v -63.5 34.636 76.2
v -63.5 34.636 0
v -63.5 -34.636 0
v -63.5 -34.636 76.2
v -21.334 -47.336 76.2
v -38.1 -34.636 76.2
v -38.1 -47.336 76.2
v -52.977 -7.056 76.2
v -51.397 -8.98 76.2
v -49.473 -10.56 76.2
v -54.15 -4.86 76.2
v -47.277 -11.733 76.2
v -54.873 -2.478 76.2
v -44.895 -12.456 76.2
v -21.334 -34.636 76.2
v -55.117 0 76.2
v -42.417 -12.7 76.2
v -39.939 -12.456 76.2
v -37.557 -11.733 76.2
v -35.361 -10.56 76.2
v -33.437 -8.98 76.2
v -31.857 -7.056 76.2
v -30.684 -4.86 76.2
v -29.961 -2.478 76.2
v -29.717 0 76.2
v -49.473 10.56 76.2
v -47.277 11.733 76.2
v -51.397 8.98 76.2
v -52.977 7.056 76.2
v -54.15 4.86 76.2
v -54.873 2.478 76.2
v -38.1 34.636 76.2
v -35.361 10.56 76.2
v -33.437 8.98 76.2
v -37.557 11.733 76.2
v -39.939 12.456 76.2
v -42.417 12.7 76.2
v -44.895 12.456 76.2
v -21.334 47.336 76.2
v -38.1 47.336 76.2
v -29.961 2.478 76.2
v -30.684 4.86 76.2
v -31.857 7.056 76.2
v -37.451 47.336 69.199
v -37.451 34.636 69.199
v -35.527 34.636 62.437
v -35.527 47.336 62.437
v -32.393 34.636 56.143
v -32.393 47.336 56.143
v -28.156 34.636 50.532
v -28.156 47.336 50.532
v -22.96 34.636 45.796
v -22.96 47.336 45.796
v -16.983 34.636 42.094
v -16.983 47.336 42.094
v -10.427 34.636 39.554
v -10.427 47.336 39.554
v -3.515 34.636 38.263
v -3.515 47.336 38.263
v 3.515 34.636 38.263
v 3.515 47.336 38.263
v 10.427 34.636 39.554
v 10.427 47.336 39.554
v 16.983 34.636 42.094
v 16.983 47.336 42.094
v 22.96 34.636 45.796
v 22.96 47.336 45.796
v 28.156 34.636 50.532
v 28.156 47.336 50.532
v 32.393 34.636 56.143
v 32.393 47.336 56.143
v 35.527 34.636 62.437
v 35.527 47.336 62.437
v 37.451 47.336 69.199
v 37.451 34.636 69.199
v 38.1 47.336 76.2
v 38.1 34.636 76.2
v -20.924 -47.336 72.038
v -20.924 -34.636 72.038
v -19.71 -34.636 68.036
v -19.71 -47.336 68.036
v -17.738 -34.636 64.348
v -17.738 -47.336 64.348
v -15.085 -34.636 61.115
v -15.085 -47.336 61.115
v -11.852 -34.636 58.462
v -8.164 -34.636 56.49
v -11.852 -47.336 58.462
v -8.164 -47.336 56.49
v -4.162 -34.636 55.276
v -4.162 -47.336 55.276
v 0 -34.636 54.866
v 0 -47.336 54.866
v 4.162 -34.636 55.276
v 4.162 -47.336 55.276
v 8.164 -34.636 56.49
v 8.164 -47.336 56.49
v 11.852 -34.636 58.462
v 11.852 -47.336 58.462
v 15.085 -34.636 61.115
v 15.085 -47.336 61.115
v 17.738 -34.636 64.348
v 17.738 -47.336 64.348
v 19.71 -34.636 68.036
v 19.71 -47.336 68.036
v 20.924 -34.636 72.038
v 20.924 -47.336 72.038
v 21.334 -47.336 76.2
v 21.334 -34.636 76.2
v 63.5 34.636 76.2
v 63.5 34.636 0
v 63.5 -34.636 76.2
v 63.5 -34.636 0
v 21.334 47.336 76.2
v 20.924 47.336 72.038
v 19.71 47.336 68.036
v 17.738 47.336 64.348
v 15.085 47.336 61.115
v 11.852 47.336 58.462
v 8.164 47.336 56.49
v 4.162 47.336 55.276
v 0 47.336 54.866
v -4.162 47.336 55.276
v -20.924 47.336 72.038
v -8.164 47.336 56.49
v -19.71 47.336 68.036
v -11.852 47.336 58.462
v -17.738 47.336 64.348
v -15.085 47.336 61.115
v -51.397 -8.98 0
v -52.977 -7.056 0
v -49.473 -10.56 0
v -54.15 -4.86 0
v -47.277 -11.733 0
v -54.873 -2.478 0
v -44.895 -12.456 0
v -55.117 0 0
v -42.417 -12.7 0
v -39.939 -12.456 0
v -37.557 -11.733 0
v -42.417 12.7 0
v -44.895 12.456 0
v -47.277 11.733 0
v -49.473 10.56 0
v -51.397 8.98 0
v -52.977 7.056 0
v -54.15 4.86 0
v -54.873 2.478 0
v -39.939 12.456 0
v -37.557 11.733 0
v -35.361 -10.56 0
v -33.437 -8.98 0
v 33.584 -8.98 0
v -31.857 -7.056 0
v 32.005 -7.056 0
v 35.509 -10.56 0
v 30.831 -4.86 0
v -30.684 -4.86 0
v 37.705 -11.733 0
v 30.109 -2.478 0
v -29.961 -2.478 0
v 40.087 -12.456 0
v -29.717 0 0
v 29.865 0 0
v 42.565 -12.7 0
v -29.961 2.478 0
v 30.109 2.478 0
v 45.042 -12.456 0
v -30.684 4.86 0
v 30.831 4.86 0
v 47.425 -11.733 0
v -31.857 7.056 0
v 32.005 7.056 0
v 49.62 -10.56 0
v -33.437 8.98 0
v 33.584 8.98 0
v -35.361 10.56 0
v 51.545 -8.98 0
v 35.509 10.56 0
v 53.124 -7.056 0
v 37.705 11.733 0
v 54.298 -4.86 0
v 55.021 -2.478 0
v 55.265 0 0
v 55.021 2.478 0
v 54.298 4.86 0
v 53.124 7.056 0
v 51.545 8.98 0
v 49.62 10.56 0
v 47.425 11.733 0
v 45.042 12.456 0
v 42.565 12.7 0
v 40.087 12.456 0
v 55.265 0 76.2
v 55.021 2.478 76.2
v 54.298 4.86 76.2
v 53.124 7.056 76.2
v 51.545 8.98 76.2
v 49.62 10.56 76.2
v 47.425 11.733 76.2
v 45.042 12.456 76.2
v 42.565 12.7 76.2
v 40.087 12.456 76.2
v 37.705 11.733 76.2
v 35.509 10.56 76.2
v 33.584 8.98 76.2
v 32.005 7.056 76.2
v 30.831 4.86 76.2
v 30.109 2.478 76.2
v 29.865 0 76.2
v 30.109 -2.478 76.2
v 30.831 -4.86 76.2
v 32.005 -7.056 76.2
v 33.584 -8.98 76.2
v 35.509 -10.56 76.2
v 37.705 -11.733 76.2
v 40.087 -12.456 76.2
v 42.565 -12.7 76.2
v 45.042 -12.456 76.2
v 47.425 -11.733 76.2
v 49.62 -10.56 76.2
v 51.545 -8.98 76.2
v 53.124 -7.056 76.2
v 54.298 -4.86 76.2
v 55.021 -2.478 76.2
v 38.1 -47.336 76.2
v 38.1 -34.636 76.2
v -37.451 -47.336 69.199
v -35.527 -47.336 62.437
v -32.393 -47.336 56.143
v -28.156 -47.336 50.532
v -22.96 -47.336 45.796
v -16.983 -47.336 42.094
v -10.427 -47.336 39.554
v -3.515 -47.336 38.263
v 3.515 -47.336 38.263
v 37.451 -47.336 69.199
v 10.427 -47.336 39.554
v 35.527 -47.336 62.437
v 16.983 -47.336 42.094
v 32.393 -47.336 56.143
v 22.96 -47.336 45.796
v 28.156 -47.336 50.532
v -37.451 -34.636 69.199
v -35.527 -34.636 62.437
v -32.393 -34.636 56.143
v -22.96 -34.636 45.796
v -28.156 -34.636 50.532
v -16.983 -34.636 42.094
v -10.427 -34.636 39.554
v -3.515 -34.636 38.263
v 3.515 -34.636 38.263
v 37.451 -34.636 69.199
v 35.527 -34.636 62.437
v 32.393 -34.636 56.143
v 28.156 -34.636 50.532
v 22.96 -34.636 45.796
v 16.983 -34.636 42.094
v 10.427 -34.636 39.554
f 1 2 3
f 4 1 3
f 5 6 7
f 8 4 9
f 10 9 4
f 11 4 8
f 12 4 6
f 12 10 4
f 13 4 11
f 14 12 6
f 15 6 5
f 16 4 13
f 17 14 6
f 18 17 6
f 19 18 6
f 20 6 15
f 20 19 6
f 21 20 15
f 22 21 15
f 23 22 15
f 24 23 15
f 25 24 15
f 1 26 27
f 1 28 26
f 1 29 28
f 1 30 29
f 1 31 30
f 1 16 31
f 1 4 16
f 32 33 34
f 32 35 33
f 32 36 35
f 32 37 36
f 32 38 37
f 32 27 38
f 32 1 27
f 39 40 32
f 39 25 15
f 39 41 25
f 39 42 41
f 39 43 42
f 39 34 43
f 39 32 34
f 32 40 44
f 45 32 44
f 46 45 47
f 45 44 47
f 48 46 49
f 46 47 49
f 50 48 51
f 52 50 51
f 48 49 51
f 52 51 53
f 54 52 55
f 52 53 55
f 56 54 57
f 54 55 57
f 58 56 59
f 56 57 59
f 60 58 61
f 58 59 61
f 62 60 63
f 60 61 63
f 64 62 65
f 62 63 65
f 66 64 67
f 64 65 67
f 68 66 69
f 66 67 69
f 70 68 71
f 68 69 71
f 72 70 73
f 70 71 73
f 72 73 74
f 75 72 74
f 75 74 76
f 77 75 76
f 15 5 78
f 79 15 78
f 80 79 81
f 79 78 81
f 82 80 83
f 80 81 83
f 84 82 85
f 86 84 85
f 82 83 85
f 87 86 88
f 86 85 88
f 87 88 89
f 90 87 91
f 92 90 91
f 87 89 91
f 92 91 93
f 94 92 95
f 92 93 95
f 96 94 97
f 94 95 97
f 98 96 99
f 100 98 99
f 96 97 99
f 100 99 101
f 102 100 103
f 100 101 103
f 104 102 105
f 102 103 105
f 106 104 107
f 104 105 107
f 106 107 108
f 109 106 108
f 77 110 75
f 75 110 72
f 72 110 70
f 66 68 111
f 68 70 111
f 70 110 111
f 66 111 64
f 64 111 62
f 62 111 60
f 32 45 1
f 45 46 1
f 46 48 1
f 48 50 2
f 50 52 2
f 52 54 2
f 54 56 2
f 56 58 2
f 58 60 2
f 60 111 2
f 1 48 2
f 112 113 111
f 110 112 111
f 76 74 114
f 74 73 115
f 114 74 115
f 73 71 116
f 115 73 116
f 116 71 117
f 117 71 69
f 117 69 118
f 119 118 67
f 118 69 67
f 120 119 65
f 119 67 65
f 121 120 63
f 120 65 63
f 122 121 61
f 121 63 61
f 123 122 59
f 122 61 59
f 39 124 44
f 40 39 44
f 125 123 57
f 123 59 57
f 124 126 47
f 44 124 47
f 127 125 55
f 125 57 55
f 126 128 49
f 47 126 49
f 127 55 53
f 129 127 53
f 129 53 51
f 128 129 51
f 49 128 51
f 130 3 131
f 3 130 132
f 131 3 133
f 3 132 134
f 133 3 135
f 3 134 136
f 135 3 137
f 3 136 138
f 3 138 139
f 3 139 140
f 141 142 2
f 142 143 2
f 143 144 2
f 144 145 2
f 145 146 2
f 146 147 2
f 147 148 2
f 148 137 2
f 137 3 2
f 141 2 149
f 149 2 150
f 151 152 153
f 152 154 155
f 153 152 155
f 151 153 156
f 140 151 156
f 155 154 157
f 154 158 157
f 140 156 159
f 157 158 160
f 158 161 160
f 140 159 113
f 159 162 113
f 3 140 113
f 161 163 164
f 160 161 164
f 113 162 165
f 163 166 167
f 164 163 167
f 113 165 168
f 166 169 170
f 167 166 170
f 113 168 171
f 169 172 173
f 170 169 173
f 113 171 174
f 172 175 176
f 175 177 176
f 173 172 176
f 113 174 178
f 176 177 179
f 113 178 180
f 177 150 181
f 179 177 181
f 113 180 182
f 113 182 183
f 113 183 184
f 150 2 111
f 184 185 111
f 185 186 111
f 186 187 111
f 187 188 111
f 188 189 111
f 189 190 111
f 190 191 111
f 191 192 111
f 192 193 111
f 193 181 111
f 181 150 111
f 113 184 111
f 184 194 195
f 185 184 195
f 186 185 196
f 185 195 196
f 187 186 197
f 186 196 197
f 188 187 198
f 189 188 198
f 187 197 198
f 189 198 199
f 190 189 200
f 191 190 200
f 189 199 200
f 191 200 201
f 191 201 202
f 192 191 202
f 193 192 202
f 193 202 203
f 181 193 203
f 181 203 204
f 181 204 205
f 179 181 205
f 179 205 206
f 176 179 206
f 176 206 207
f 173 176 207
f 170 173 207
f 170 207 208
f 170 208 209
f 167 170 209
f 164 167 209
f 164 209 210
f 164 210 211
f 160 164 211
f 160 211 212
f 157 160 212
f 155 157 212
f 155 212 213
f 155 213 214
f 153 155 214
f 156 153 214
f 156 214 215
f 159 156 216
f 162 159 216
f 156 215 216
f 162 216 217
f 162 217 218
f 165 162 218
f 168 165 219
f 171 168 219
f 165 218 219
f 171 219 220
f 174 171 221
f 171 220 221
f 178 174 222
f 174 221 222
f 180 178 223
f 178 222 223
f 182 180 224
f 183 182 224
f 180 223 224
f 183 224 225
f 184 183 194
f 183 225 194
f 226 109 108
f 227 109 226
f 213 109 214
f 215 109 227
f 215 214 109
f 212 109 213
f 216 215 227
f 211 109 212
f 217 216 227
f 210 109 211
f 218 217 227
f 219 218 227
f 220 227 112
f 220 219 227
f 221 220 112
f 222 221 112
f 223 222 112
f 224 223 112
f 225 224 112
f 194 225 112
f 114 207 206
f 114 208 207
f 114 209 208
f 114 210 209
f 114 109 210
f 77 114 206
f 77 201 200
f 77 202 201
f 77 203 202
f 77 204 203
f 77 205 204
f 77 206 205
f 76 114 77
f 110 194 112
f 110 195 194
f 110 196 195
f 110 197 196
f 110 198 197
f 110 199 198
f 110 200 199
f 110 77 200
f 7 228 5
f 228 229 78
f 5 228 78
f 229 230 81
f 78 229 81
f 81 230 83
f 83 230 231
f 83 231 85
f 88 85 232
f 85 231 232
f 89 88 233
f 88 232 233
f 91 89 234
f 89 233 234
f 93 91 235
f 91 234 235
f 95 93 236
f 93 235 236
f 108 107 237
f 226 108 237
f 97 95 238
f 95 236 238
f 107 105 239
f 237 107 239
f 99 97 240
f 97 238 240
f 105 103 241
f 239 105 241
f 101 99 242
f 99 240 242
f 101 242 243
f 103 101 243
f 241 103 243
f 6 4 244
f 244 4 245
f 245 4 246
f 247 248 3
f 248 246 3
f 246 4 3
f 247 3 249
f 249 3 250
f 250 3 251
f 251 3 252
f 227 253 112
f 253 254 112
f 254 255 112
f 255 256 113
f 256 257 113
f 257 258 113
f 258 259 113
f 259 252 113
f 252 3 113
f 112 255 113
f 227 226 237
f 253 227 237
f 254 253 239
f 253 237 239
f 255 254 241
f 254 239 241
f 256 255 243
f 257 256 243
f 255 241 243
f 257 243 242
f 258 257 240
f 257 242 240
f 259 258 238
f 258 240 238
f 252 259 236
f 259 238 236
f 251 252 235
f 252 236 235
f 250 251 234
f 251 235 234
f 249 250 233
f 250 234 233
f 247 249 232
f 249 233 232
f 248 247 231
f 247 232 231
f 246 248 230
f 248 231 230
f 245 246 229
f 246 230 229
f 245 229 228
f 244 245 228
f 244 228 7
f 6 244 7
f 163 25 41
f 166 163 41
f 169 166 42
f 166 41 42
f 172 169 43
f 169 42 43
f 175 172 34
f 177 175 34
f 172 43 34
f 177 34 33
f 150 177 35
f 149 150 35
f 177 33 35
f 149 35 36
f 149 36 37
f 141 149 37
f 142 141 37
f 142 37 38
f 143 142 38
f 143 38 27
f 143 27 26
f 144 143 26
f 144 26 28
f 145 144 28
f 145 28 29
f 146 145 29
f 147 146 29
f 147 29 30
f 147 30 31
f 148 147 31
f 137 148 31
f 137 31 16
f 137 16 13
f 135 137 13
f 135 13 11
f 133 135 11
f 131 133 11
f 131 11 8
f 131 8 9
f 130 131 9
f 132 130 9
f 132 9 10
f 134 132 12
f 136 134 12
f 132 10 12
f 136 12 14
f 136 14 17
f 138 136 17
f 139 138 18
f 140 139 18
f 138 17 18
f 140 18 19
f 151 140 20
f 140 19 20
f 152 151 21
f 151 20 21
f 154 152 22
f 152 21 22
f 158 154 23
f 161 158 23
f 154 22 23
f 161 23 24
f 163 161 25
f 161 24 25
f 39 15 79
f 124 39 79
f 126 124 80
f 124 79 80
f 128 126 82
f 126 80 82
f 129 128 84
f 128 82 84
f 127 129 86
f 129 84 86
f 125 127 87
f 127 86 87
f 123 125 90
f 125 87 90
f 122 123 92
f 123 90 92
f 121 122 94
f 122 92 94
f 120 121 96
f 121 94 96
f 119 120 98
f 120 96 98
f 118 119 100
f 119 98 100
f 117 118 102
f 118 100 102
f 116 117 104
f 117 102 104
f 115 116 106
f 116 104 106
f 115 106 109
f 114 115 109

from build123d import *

# Parameters (mm, degrees)
F1_DEPTH = 76.2
F3_DEPTH = 12.7
F4_R     = 21.3338739626
F5_DEPTH = 101.6
F7_DEPTH = 12.7
F9_DEPTH = 127


with BuildPart() as f1:
    # F0 (on Top) → F1 (new body)
    with BuildSketch(Plane.XY):
        Polygon((38.1, -34.6363636543), (63.5, -34.6363636543), (63.5, 34.6363636543), (38.1, 34.6363636543), (38.1, 47.3363636543), (-38.1, 47.3363636543), (-38.1, 34.6363636543), (-63.5, 34.6363636543), (-63.5, -34.6363636543), (-38.1, -34.6363636543), (-38.1, -47.3363636543), (38.1, -47.3363636543), align=None)
    extrude(amount=F1_DEPTH)

    # F2 (on face) → F3 (cut)
    with BuildSketch(Plane.XZ.offset(47.3363636543)):
        with BuildLine():
            Line((38.1, 0), (38.1, 76.2))
            ThreePointArc((38.1, 76.2), (0, 38.1), (-38.1, 76.2))
            Line((-38.1, 76.2), (-38.1, 0))
            Line((-38.1, 0), (38.1, 0))
        make_face()
        with BuildLine():
            Line((21.3338739626, 76.2), (38.1, 76.2))
            ThreePointArc((38.1, 76.2), (0, 114.3), (-38.1, 76.2))
            Line((-38.1, 76.2), (-21.3338739626, 76.2))
            ThreePointArc((-21.3338739626, 76.2), (0, 97.5338739626), (21.3338739626, 76.2))
        make_face()
        with BuildLine():
            ThreePointArc((-21.3338739626, 76.2), (0, 54.8661260374), (21.3338739626, 76.2))
            Line((21.3338739626, 76.2), (-21.3338739626, 76.2))
        make_face()
    extrude(amount=-F3_DEPTH, mode=Mode.SUBTRACT)

    # F4 (on face) → F5 (cut)
    with BuildSketch(Plane.XZ.offset(34.6363636543)):
        with Locations((0, 76.2)):
            Circle(F4_R)
    extrude(amount=-F5_DEPTH, mode=Mode.SUBTRACT)

    # F6 (on face) → F7 (cut)
    with BuildSketch(Plane(origin=(0, 47.3363636543, 0), x_dir=(-1, 0, 0), z_dir=(0, 1, 0))):
        with BuildLine():
            ThreePointArc((38.1, 76.2), (0, 38.1), (-38.1, 76.2))
            Line((-38.1, 76.2), (-38.1, 0))
            Line((-38.1, 0), (38.1, 0))
            Line((38.1, 0), (38.1, 76.2))
        make_face()
    extrude(amount=-F7_DEPTH, mode=Mode.SUBTRACT)

    # F8 (on face) → F9 (cut)
    with BuildSketch(Plane.XY.offset(76.2)):
        with BuildLine():
            Line((55.2647357479, 0), (29.8647357479, 0))
            ThreePointArc((29.8647357479, 0), (42.5647357479, -12.7), (55.2647357479, 0))
        make_face()
        with BuildLine():
            ThreePointArc((55.2647357479, 0), (42.5647357479, 12.7), (29.8647357479, 0))
            Line((29.8647357479, 0), (55.2647357479, 0))
        make_face()
        with BuildLine():
            ThreePointArc((-55.1169369813, 0), (-42.4169369813, -12.7), (-29.7169369813, 0))
            Line((-29.7169369813, 0), (-55.1169369813, 0))
        make_face()
        with BuildLine():
            Line((-55.1169369813, 0), (-29.7169369813, 0))
            ThreePointArc((-29.7169369813, 0), (-42.4169369813, 12.7), (-55.1169369813, 0))
        make_face()
    extrude(amount=-F9_DEPTH, mode=Mode.SUBTRACT)


solid = f1.part
